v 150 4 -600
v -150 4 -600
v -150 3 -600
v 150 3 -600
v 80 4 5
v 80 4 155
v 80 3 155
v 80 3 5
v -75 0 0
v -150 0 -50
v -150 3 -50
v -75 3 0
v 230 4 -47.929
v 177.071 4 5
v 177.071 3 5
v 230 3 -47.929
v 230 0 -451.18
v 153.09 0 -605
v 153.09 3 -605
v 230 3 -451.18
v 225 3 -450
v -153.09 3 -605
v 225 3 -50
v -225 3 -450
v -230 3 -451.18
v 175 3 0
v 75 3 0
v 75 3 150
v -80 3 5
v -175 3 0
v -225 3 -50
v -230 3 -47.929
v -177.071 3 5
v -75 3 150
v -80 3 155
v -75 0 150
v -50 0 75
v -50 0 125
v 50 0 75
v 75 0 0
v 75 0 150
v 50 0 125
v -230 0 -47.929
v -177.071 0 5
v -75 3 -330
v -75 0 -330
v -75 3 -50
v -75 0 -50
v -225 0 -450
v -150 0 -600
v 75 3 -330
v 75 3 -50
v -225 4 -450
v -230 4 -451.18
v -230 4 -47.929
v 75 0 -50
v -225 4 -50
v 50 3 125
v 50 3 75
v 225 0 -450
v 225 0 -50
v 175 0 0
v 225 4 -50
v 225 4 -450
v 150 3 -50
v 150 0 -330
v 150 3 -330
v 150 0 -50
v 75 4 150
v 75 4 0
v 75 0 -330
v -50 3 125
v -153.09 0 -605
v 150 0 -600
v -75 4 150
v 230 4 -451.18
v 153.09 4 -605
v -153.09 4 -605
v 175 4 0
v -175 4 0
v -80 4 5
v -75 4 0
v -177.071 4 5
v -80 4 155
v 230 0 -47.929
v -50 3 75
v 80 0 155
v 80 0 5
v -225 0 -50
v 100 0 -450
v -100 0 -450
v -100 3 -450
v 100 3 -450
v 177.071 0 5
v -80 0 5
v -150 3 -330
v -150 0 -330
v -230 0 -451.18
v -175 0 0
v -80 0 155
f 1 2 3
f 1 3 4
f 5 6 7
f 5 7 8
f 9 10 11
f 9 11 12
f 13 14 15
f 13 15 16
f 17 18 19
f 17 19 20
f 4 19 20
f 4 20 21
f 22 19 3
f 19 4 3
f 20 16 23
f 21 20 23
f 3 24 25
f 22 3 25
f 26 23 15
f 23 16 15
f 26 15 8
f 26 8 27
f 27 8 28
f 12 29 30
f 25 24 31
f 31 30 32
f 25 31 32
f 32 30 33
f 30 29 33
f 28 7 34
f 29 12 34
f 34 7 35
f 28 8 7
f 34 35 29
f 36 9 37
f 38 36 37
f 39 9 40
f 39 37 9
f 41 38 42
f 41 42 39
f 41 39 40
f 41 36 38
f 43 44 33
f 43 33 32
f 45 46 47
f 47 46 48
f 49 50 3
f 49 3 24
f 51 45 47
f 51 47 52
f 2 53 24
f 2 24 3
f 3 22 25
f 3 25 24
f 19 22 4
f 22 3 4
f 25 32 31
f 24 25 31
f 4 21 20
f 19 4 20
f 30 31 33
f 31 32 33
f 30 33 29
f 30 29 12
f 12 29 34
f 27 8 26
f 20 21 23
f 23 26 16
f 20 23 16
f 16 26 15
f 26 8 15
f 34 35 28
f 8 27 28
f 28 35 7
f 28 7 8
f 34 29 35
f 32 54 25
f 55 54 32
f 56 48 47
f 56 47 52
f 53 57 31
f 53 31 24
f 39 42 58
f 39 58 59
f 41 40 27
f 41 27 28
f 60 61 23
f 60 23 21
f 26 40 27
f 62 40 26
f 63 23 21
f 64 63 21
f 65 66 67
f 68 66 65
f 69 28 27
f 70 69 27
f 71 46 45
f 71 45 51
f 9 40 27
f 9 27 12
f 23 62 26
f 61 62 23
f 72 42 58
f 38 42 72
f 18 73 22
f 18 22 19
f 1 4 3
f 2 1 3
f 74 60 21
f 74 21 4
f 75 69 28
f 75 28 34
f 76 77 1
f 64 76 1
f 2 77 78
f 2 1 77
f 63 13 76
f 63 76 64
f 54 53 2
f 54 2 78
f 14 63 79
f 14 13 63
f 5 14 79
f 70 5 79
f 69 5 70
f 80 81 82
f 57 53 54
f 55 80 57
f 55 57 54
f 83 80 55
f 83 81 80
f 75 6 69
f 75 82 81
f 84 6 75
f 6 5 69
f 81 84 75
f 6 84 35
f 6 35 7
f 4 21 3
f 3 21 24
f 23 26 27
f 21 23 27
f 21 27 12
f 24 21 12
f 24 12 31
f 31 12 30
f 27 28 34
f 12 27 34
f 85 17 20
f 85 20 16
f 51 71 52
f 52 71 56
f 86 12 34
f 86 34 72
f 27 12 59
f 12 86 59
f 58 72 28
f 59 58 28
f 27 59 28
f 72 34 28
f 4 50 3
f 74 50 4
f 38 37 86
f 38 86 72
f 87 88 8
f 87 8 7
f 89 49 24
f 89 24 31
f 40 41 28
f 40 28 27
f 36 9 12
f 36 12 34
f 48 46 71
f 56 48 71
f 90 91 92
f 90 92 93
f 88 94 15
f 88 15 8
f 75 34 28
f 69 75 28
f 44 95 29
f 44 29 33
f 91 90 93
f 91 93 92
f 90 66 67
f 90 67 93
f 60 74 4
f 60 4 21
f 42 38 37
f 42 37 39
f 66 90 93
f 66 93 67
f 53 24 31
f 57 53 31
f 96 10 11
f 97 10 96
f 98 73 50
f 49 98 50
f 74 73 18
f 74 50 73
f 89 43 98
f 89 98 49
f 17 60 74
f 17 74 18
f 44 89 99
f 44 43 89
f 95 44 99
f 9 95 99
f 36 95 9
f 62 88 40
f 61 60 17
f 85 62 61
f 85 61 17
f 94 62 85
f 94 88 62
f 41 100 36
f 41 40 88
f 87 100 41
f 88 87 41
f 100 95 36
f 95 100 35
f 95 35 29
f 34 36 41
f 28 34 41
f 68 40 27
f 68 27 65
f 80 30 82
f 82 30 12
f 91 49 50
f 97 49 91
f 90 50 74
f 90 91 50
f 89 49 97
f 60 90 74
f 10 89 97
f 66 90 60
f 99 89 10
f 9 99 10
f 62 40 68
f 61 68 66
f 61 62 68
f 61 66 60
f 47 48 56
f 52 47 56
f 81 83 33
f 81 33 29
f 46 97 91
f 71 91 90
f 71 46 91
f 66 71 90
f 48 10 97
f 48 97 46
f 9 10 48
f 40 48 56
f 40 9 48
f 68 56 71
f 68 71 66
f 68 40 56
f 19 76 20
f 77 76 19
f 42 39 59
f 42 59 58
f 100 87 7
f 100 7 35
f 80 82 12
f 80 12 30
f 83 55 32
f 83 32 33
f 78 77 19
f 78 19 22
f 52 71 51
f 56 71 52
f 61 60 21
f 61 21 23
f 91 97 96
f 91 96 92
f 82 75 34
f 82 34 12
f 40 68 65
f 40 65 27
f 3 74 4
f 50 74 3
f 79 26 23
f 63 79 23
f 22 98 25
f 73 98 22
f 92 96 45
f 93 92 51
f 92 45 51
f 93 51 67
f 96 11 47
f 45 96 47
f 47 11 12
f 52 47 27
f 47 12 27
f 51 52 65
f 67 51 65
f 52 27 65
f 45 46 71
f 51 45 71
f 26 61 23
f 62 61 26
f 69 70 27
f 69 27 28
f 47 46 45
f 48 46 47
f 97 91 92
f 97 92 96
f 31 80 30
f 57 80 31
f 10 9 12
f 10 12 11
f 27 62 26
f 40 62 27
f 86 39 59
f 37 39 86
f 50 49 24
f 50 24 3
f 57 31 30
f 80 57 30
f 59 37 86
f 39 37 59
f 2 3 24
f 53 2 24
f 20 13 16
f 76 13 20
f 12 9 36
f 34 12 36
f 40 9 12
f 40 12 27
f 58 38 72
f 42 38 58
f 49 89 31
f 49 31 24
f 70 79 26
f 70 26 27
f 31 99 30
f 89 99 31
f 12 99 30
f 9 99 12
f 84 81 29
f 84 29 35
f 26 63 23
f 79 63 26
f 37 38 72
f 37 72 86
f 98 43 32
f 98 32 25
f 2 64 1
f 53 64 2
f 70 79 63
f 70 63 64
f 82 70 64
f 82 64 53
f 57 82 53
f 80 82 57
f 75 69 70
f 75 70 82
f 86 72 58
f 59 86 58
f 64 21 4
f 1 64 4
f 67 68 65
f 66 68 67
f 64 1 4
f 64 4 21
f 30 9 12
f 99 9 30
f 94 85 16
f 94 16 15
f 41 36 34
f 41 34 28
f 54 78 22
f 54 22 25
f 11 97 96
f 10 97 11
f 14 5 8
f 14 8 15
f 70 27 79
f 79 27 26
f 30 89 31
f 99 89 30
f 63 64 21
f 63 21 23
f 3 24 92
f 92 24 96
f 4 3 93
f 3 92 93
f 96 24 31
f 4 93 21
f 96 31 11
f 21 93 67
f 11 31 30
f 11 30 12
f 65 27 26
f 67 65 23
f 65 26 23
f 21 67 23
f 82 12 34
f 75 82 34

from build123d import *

# Parameters (mm, degrees)
F1_DEPTH  = 3
F2_W      = 150
F2_H      = 150
F3_DEPTH  = 3
F4_W      = 150
F4_H      = 280
F5_DEPTH  = 3
F6_W      = 150
F6_H      = 280
F7_DEPTH  = 3
F9_DEPTH  = 3
F11_DEPTH = 3
F13_DEPTH = 1
F15_DEPTH = 1


with BuildPart() as f1:
    # F0 (on Front) → F1 (new body)
    with BuildSketch(Plane.XZ):
        Polygon((50, 125), (0, 125), (-50, 125), (-50, 100), (-50, 75), (0, 75), (50, 75), (50, 100), align=None)
    extrude(amount=-F1_DEPTH)


with BuildPart() as f3:
    # F2 (on Front) → F3 (new body)
    with BuildSketch(Plane.XZ):
        with Locations((0, 75)):
            Rectangle(F2_W, F2_H)
        Polygon((-50, 125), (0, 125), (50, 125), (50, 100), (50, 75), (0, 75), (-50, 75), (-50, 100), align=None, mode=Mode.SUBTRACT)
    extrude(amount=-F3_DEPTH)


with BuildPart() as f5:
    # F4 (on Front) → F5 (new body)
    with BuildSketch(Plane.XZ):
        with Locations((0, -190)):
            Rectangle(F4_W, F4_H)
    extrude(amount=-F5_DEPTH)


with BuildPart() as f7:
    # F6 (on Front) → F7 (new body)
    with BuildSketch(Plane.XZ):
        Polygon((75, 0), (-75, 0), (-150, -50), (-150, -330), (-100, -450), (100, -450), (150, -330), (150, -50), align=None)
        with Locations((0, -190)):
            Rectangle(F6_W, F6_H, mode=Mode.SUBTRACT)
    extrude(amount=-F7_DEPTH)


with BuildPart() as f9:
    # F8 (on face) → F9 (new body)
    with BuildSketch(Plane.XZ):
        Polygon((175, 0), (75, 0), (150, -50), (150, -330), (100, -450), (-100, -450), (-150, -330), (-150, -50), (-75, 0), (-175, 0), (-225, -50), (-225, -450), (-150, -600), (150, -600), (225, -450), (225, -50), align=None)
    extrude(amount=-F9_DEPTH)


with BuildPart() as f11:
    # F10 (on face) → F11 (new body)
    with BuildSketch(Plane.XZ):
        Polygon((230, -47.928932), (177.071068, 5), (80, 5), (80, 155), (-80, 155), (-80, 5), (-177.071068, 5), (-230, -47.928932), (-230, -451.18034), (-153.09017, -605), (153.09017, -605), (230, -451.18034), align=None)
        Polygon((-75, 150), (75, 150), (75, 0), (175, 0), (225, -50), (225, -450), (150, -600), (-150, -600), (-225, -450), (-225, -50), (-175, 0), (-75, 0), align=None, mode=Mode.SUBTRACT)
    extrude(amount=-F11_DEPTH)


with BuildPart() as f13:
    # F12 (on face) → F13 (new body)
    with BuildSketch(Plane(origin=(0, 3, 0), x_dir=(-1, 0, 0), z_dir=(0, 1, 0))):
        Polygon((75, 0), (75, 150), (-75, 150), (-75, 0), (-175, 0), (-225, -50), (-225, -450), (-150, -600), (150, -600), (225, -450), (225, -50), (175, 0), align=None)
    extrude(amount=F13_DEPTH)


with BuildPart() as f15:
    # F14 (on face) → F15 (new body)
    with BuildSketch(Plane(origin=(0, 4, 0), x_dir=(-1, 0, 0), z_dir=(0, 1, 0))):
        Polygon((80, 155), (-80, 155), (-80, 5), (-177.071068, 5), (-230, -47.928932), (-230, -451.18034), (-153.09017, -605), (153.09017, -605), (230, -451.18034), (230, -47.928932), (177.071068, 5), (80, 5), align=None)
        Polygon((-75, 0), (-75, 150), (75, 150), (75, 0), (175, 0), (225, -50), (225, -450), (150, -600), (-150, -600), (-225, -450), (-225, -50), (-175, 0), align=None, mode=Mode.SUBTRACT)
    extrude(amount=-F15_DEPTH)


solid = Compound([f1.part, f3.part, f5.part, f7.part, f9.part, f11.part, f13.part, f15.part])
